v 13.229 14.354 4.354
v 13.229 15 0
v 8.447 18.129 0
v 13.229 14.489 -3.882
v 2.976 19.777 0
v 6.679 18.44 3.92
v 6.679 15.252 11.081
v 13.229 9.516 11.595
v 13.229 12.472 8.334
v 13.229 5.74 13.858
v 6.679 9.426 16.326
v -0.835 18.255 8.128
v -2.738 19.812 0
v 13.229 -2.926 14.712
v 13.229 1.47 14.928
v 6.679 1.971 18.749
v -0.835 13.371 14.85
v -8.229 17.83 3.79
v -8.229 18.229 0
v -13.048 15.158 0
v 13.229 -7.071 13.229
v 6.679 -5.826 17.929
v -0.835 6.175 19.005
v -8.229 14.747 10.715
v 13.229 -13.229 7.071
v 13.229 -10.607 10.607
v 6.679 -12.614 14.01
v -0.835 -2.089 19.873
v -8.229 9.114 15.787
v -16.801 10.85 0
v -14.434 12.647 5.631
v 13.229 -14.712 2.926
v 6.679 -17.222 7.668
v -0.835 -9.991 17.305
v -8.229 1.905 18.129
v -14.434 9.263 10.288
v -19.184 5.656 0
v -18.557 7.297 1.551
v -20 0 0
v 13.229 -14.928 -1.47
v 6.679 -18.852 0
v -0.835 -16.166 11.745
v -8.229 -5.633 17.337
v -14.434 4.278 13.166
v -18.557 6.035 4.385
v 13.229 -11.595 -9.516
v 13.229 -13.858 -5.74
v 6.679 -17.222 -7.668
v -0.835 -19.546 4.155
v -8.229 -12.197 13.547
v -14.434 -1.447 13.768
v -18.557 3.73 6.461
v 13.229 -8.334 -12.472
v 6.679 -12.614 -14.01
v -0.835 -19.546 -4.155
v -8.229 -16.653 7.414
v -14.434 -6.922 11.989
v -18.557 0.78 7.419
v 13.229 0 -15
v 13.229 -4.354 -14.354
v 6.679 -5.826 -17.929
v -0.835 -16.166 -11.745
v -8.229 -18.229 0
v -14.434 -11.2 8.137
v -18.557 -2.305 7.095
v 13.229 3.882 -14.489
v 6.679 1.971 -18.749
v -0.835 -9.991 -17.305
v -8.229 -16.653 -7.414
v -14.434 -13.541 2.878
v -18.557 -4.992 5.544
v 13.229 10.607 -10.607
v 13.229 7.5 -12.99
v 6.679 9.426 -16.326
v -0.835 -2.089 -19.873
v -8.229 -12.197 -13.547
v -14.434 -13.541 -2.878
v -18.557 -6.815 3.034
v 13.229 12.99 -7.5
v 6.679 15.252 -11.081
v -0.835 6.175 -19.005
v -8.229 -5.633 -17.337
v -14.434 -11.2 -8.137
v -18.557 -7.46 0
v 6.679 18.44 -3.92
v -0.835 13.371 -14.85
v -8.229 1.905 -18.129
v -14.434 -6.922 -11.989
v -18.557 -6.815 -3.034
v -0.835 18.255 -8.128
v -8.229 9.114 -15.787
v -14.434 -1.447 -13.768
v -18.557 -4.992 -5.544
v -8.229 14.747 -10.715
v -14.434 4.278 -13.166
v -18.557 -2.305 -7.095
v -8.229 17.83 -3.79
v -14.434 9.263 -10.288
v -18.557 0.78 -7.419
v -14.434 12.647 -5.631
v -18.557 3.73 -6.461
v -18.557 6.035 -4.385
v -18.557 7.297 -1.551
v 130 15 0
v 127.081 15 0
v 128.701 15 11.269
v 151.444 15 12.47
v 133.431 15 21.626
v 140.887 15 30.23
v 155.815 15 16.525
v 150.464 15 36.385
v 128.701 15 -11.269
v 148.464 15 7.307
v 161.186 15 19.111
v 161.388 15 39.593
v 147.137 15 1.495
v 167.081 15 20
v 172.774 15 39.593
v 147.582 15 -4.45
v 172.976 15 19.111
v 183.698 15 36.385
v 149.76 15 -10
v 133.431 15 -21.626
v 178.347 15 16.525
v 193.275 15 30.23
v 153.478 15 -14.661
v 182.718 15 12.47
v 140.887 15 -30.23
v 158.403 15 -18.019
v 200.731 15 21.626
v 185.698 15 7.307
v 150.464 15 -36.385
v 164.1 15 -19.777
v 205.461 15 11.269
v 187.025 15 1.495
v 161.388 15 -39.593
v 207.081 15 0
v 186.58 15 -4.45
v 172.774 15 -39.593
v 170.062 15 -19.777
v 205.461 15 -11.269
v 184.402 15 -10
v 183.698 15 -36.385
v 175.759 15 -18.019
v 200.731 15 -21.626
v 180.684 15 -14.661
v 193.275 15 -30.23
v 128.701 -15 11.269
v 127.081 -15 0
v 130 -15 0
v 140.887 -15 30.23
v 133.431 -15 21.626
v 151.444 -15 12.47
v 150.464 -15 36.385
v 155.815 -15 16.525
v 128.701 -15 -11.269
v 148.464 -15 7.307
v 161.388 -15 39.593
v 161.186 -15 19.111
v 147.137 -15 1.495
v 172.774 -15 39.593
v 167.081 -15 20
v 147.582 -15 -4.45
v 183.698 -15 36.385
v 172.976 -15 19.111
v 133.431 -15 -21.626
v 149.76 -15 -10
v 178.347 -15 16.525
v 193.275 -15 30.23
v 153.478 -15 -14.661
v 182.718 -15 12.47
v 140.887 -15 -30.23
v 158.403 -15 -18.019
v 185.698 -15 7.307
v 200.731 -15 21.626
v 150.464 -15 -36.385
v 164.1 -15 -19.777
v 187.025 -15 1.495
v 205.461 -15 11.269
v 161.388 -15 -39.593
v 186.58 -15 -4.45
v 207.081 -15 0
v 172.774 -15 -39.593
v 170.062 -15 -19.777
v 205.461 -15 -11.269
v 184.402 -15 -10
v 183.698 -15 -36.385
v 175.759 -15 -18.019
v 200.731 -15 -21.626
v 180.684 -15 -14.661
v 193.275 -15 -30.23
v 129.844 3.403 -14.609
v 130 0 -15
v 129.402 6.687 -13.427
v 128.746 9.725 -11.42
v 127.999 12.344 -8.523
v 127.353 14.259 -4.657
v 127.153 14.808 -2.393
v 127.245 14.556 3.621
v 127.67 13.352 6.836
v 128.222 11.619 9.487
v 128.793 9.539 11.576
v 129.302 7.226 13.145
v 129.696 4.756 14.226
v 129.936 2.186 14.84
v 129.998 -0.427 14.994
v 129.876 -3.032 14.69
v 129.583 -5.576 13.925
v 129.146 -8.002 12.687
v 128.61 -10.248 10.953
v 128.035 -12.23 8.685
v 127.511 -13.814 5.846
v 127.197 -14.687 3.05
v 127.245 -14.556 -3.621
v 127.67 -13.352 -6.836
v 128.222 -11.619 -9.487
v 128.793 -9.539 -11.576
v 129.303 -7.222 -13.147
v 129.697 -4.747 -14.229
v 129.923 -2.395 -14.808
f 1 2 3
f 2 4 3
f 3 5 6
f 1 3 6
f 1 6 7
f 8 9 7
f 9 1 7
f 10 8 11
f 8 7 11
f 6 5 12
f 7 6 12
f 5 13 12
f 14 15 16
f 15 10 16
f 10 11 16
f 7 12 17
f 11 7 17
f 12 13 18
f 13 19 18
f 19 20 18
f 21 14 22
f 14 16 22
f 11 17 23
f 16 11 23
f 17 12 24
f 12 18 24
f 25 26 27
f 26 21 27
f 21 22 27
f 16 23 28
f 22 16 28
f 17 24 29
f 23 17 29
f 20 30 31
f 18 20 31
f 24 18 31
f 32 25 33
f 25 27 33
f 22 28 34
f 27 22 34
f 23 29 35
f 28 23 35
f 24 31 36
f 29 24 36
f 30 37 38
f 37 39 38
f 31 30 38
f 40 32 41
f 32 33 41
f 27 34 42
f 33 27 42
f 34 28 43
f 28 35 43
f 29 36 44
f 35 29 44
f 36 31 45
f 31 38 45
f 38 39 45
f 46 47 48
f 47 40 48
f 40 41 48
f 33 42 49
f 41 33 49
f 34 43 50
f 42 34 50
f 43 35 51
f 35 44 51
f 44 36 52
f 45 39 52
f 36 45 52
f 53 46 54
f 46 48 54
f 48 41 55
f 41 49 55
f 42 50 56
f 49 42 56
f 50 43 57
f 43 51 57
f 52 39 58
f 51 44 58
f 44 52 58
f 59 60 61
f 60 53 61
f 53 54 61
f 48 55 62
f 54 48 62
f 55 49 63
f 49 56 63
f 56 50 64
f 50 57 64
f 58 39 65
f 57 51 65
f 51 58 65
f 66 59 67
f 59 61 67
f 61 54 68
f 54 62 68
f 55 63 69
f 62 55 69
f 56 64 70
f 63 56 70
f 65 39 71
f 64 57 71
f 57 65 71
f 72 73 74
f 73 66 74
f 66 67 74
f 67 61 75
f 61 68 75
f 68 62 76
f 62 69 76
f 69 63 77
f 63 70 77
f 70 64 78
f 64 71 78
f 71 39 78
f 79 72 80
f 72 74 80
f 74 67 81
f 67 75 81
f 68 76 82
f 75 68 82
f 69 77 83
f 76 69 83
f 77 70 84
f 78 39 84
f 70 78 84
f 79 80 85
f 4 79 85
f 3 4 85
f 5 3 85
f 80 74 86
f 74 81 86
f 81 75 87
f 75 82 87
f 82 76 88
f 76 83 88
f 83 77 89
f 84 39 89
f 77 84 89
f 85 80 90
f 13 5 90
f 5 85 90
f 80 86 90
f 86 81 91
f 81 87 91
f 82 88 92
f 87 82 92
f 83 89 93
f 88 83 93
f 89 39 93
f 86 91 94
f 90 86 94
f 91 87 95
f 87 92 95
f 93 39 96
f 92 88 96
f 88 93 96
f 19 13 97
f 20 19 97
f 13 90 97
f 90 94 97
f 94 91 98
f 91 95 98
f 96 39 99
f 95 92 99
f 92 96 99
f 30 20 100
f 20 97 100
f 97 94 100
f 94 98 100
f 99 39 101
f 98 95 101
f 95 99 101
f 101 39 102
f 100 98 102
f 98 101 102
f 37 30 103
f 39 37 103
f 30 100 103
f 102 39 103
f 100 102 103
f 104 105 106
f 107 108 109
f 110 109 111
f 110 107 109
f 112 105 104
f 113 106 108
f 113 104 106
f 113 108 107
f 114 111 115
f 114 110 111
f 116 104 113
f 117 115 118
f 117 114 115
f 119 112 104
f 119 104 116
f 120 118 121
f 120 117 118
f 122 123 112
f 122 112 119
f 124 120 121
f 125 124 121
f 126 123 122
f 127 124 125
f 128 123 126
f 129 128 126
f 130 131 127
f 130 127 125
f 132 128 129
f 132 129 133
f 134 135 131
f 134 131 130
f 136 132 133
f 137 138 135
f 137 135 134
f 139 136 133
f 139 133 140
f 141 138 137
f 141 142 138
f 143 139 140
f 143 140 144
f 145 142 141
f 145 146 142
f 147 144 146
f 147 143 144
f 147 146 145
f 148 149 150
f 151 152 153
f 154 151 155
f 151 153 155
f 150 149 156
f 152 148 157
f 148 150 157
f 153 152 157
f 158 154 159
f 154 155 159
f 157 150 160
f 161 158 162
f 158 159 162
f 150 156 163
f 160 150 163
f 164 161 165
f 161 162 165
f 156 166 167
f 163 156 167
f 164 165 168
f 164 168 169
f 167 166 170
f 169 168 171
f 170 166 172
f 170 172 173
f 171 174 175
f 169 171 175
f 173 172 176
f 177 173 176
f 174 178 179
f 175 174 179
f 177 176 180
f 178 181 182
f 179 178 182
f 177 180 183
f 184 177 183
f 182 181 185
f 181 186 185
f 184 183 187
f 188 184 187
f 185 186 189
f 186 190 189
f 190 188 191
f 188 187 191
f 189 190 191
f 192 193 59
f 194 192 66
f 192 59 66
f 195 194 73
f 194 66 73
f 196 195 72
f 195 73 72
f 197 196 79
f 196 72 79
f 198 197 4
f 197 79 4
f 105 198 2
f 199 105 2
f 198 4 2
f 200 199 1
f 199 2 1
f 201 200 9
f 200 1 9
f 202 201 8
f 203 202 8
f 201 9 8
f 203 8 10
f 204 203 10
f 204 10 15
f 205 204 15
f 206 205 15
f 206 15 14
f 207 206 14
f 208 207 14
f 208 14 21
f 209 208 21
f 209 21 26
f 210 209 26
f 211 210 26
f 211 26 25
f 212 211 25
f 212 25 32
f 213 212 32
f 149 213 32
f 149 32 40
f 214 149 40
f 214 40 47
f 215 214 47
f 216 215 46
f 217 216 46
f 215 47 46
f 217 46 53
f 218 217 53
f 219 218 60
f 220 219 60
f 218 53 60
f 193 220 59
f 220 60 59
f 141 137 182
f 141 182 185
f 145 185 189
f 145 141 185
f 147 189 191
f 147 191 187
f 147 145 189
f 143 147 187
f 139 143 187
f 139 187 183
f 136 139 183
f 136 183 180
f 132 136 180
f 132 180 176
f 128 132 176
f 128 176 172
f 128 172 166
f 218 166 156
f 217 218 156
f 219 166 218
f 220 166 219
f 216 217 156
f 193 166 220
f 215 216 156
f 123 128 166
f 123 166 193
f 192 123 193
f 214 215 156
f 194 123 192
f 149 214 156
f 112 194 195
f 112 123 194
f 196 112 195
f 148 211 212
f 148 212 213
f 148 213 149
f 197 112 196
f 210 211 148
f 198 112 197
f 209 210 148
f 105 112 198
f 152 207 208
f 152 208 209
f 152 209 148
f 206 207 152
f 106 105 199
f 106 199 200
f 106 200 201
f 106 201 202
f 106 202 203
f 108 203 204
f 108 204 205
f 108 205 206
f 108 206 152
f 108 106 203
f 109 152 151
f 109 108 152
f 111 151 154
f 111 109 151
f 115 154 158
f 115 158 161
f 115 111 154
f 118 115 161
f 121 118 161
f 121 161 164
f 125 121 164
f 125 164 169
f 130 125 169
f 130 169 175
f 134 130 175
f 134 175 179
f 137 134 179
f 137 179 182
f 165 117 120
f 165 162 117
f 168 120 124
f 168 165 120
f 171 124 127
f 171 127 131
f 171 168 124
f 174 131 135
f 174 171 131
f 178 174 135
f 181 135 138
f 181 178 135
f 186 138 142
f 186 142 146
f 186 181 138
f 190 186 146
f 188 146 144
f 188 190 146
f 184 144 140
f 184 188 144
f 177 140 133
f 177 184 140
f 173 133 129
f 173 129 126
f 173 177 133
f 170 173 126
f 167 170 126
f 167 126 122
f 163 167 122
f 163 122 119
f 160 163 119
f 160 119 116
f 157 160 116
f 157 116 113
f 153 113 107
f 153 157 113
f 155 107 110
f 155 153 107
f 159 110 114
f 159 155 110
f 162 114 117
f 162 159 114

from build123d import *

# Parameters (mm, degrees)
SKETCH1_R           = 15
BOSS_EXTRUDE1_DEPTH = 130
SKETCH7_R           = 40
SKETCH7_R_2         = 20
BOSS_EXTRUDE2_DEPTH = 15


with BuildPart() as part:
    # Sketch1 → Boss-Extrude1 (new body)
    with BuildSketch(Plane(origin=(0, 0, 0), x_dir=(0, 0, -1), z_dir=(1, 0, 0))):
        Circle(SKETCH1_R)
    extrude(amount=BOSS_EXTRUDE1_DEPTH)

    # Sketch4 → Revolve1 (revolve)
    with BuildSketch(Plane.XY):
        with BuildLine():
            Line((-20, 0), (20, 0))
            ThreePointArc((20, 0), (0, 20), (-20, 0))
        make_face()
    revolve(axis=Axis((0, 0, 0), (1, 0, 0)))

    # Sketch7 → Boss-Extrude2 (add, symmetric)
    with BuildSketch(Plane(origin=(0, 0, 0), x_dir=(1, 0, 0), z_dir=(0, 1, 0))):
        with Locations((167.080992435, 0)):
            Circle(SKETCH7_R)
        with Locations(Location((167.080992435, 0, 0), (0, 0, 270))):
            Circle(SKETCH7_R_2, mode=Mode.SUBTRACT)
    extrude(amount=BOSS_EXTRUDE2_DEPTH, both=True)


solid = part.part
